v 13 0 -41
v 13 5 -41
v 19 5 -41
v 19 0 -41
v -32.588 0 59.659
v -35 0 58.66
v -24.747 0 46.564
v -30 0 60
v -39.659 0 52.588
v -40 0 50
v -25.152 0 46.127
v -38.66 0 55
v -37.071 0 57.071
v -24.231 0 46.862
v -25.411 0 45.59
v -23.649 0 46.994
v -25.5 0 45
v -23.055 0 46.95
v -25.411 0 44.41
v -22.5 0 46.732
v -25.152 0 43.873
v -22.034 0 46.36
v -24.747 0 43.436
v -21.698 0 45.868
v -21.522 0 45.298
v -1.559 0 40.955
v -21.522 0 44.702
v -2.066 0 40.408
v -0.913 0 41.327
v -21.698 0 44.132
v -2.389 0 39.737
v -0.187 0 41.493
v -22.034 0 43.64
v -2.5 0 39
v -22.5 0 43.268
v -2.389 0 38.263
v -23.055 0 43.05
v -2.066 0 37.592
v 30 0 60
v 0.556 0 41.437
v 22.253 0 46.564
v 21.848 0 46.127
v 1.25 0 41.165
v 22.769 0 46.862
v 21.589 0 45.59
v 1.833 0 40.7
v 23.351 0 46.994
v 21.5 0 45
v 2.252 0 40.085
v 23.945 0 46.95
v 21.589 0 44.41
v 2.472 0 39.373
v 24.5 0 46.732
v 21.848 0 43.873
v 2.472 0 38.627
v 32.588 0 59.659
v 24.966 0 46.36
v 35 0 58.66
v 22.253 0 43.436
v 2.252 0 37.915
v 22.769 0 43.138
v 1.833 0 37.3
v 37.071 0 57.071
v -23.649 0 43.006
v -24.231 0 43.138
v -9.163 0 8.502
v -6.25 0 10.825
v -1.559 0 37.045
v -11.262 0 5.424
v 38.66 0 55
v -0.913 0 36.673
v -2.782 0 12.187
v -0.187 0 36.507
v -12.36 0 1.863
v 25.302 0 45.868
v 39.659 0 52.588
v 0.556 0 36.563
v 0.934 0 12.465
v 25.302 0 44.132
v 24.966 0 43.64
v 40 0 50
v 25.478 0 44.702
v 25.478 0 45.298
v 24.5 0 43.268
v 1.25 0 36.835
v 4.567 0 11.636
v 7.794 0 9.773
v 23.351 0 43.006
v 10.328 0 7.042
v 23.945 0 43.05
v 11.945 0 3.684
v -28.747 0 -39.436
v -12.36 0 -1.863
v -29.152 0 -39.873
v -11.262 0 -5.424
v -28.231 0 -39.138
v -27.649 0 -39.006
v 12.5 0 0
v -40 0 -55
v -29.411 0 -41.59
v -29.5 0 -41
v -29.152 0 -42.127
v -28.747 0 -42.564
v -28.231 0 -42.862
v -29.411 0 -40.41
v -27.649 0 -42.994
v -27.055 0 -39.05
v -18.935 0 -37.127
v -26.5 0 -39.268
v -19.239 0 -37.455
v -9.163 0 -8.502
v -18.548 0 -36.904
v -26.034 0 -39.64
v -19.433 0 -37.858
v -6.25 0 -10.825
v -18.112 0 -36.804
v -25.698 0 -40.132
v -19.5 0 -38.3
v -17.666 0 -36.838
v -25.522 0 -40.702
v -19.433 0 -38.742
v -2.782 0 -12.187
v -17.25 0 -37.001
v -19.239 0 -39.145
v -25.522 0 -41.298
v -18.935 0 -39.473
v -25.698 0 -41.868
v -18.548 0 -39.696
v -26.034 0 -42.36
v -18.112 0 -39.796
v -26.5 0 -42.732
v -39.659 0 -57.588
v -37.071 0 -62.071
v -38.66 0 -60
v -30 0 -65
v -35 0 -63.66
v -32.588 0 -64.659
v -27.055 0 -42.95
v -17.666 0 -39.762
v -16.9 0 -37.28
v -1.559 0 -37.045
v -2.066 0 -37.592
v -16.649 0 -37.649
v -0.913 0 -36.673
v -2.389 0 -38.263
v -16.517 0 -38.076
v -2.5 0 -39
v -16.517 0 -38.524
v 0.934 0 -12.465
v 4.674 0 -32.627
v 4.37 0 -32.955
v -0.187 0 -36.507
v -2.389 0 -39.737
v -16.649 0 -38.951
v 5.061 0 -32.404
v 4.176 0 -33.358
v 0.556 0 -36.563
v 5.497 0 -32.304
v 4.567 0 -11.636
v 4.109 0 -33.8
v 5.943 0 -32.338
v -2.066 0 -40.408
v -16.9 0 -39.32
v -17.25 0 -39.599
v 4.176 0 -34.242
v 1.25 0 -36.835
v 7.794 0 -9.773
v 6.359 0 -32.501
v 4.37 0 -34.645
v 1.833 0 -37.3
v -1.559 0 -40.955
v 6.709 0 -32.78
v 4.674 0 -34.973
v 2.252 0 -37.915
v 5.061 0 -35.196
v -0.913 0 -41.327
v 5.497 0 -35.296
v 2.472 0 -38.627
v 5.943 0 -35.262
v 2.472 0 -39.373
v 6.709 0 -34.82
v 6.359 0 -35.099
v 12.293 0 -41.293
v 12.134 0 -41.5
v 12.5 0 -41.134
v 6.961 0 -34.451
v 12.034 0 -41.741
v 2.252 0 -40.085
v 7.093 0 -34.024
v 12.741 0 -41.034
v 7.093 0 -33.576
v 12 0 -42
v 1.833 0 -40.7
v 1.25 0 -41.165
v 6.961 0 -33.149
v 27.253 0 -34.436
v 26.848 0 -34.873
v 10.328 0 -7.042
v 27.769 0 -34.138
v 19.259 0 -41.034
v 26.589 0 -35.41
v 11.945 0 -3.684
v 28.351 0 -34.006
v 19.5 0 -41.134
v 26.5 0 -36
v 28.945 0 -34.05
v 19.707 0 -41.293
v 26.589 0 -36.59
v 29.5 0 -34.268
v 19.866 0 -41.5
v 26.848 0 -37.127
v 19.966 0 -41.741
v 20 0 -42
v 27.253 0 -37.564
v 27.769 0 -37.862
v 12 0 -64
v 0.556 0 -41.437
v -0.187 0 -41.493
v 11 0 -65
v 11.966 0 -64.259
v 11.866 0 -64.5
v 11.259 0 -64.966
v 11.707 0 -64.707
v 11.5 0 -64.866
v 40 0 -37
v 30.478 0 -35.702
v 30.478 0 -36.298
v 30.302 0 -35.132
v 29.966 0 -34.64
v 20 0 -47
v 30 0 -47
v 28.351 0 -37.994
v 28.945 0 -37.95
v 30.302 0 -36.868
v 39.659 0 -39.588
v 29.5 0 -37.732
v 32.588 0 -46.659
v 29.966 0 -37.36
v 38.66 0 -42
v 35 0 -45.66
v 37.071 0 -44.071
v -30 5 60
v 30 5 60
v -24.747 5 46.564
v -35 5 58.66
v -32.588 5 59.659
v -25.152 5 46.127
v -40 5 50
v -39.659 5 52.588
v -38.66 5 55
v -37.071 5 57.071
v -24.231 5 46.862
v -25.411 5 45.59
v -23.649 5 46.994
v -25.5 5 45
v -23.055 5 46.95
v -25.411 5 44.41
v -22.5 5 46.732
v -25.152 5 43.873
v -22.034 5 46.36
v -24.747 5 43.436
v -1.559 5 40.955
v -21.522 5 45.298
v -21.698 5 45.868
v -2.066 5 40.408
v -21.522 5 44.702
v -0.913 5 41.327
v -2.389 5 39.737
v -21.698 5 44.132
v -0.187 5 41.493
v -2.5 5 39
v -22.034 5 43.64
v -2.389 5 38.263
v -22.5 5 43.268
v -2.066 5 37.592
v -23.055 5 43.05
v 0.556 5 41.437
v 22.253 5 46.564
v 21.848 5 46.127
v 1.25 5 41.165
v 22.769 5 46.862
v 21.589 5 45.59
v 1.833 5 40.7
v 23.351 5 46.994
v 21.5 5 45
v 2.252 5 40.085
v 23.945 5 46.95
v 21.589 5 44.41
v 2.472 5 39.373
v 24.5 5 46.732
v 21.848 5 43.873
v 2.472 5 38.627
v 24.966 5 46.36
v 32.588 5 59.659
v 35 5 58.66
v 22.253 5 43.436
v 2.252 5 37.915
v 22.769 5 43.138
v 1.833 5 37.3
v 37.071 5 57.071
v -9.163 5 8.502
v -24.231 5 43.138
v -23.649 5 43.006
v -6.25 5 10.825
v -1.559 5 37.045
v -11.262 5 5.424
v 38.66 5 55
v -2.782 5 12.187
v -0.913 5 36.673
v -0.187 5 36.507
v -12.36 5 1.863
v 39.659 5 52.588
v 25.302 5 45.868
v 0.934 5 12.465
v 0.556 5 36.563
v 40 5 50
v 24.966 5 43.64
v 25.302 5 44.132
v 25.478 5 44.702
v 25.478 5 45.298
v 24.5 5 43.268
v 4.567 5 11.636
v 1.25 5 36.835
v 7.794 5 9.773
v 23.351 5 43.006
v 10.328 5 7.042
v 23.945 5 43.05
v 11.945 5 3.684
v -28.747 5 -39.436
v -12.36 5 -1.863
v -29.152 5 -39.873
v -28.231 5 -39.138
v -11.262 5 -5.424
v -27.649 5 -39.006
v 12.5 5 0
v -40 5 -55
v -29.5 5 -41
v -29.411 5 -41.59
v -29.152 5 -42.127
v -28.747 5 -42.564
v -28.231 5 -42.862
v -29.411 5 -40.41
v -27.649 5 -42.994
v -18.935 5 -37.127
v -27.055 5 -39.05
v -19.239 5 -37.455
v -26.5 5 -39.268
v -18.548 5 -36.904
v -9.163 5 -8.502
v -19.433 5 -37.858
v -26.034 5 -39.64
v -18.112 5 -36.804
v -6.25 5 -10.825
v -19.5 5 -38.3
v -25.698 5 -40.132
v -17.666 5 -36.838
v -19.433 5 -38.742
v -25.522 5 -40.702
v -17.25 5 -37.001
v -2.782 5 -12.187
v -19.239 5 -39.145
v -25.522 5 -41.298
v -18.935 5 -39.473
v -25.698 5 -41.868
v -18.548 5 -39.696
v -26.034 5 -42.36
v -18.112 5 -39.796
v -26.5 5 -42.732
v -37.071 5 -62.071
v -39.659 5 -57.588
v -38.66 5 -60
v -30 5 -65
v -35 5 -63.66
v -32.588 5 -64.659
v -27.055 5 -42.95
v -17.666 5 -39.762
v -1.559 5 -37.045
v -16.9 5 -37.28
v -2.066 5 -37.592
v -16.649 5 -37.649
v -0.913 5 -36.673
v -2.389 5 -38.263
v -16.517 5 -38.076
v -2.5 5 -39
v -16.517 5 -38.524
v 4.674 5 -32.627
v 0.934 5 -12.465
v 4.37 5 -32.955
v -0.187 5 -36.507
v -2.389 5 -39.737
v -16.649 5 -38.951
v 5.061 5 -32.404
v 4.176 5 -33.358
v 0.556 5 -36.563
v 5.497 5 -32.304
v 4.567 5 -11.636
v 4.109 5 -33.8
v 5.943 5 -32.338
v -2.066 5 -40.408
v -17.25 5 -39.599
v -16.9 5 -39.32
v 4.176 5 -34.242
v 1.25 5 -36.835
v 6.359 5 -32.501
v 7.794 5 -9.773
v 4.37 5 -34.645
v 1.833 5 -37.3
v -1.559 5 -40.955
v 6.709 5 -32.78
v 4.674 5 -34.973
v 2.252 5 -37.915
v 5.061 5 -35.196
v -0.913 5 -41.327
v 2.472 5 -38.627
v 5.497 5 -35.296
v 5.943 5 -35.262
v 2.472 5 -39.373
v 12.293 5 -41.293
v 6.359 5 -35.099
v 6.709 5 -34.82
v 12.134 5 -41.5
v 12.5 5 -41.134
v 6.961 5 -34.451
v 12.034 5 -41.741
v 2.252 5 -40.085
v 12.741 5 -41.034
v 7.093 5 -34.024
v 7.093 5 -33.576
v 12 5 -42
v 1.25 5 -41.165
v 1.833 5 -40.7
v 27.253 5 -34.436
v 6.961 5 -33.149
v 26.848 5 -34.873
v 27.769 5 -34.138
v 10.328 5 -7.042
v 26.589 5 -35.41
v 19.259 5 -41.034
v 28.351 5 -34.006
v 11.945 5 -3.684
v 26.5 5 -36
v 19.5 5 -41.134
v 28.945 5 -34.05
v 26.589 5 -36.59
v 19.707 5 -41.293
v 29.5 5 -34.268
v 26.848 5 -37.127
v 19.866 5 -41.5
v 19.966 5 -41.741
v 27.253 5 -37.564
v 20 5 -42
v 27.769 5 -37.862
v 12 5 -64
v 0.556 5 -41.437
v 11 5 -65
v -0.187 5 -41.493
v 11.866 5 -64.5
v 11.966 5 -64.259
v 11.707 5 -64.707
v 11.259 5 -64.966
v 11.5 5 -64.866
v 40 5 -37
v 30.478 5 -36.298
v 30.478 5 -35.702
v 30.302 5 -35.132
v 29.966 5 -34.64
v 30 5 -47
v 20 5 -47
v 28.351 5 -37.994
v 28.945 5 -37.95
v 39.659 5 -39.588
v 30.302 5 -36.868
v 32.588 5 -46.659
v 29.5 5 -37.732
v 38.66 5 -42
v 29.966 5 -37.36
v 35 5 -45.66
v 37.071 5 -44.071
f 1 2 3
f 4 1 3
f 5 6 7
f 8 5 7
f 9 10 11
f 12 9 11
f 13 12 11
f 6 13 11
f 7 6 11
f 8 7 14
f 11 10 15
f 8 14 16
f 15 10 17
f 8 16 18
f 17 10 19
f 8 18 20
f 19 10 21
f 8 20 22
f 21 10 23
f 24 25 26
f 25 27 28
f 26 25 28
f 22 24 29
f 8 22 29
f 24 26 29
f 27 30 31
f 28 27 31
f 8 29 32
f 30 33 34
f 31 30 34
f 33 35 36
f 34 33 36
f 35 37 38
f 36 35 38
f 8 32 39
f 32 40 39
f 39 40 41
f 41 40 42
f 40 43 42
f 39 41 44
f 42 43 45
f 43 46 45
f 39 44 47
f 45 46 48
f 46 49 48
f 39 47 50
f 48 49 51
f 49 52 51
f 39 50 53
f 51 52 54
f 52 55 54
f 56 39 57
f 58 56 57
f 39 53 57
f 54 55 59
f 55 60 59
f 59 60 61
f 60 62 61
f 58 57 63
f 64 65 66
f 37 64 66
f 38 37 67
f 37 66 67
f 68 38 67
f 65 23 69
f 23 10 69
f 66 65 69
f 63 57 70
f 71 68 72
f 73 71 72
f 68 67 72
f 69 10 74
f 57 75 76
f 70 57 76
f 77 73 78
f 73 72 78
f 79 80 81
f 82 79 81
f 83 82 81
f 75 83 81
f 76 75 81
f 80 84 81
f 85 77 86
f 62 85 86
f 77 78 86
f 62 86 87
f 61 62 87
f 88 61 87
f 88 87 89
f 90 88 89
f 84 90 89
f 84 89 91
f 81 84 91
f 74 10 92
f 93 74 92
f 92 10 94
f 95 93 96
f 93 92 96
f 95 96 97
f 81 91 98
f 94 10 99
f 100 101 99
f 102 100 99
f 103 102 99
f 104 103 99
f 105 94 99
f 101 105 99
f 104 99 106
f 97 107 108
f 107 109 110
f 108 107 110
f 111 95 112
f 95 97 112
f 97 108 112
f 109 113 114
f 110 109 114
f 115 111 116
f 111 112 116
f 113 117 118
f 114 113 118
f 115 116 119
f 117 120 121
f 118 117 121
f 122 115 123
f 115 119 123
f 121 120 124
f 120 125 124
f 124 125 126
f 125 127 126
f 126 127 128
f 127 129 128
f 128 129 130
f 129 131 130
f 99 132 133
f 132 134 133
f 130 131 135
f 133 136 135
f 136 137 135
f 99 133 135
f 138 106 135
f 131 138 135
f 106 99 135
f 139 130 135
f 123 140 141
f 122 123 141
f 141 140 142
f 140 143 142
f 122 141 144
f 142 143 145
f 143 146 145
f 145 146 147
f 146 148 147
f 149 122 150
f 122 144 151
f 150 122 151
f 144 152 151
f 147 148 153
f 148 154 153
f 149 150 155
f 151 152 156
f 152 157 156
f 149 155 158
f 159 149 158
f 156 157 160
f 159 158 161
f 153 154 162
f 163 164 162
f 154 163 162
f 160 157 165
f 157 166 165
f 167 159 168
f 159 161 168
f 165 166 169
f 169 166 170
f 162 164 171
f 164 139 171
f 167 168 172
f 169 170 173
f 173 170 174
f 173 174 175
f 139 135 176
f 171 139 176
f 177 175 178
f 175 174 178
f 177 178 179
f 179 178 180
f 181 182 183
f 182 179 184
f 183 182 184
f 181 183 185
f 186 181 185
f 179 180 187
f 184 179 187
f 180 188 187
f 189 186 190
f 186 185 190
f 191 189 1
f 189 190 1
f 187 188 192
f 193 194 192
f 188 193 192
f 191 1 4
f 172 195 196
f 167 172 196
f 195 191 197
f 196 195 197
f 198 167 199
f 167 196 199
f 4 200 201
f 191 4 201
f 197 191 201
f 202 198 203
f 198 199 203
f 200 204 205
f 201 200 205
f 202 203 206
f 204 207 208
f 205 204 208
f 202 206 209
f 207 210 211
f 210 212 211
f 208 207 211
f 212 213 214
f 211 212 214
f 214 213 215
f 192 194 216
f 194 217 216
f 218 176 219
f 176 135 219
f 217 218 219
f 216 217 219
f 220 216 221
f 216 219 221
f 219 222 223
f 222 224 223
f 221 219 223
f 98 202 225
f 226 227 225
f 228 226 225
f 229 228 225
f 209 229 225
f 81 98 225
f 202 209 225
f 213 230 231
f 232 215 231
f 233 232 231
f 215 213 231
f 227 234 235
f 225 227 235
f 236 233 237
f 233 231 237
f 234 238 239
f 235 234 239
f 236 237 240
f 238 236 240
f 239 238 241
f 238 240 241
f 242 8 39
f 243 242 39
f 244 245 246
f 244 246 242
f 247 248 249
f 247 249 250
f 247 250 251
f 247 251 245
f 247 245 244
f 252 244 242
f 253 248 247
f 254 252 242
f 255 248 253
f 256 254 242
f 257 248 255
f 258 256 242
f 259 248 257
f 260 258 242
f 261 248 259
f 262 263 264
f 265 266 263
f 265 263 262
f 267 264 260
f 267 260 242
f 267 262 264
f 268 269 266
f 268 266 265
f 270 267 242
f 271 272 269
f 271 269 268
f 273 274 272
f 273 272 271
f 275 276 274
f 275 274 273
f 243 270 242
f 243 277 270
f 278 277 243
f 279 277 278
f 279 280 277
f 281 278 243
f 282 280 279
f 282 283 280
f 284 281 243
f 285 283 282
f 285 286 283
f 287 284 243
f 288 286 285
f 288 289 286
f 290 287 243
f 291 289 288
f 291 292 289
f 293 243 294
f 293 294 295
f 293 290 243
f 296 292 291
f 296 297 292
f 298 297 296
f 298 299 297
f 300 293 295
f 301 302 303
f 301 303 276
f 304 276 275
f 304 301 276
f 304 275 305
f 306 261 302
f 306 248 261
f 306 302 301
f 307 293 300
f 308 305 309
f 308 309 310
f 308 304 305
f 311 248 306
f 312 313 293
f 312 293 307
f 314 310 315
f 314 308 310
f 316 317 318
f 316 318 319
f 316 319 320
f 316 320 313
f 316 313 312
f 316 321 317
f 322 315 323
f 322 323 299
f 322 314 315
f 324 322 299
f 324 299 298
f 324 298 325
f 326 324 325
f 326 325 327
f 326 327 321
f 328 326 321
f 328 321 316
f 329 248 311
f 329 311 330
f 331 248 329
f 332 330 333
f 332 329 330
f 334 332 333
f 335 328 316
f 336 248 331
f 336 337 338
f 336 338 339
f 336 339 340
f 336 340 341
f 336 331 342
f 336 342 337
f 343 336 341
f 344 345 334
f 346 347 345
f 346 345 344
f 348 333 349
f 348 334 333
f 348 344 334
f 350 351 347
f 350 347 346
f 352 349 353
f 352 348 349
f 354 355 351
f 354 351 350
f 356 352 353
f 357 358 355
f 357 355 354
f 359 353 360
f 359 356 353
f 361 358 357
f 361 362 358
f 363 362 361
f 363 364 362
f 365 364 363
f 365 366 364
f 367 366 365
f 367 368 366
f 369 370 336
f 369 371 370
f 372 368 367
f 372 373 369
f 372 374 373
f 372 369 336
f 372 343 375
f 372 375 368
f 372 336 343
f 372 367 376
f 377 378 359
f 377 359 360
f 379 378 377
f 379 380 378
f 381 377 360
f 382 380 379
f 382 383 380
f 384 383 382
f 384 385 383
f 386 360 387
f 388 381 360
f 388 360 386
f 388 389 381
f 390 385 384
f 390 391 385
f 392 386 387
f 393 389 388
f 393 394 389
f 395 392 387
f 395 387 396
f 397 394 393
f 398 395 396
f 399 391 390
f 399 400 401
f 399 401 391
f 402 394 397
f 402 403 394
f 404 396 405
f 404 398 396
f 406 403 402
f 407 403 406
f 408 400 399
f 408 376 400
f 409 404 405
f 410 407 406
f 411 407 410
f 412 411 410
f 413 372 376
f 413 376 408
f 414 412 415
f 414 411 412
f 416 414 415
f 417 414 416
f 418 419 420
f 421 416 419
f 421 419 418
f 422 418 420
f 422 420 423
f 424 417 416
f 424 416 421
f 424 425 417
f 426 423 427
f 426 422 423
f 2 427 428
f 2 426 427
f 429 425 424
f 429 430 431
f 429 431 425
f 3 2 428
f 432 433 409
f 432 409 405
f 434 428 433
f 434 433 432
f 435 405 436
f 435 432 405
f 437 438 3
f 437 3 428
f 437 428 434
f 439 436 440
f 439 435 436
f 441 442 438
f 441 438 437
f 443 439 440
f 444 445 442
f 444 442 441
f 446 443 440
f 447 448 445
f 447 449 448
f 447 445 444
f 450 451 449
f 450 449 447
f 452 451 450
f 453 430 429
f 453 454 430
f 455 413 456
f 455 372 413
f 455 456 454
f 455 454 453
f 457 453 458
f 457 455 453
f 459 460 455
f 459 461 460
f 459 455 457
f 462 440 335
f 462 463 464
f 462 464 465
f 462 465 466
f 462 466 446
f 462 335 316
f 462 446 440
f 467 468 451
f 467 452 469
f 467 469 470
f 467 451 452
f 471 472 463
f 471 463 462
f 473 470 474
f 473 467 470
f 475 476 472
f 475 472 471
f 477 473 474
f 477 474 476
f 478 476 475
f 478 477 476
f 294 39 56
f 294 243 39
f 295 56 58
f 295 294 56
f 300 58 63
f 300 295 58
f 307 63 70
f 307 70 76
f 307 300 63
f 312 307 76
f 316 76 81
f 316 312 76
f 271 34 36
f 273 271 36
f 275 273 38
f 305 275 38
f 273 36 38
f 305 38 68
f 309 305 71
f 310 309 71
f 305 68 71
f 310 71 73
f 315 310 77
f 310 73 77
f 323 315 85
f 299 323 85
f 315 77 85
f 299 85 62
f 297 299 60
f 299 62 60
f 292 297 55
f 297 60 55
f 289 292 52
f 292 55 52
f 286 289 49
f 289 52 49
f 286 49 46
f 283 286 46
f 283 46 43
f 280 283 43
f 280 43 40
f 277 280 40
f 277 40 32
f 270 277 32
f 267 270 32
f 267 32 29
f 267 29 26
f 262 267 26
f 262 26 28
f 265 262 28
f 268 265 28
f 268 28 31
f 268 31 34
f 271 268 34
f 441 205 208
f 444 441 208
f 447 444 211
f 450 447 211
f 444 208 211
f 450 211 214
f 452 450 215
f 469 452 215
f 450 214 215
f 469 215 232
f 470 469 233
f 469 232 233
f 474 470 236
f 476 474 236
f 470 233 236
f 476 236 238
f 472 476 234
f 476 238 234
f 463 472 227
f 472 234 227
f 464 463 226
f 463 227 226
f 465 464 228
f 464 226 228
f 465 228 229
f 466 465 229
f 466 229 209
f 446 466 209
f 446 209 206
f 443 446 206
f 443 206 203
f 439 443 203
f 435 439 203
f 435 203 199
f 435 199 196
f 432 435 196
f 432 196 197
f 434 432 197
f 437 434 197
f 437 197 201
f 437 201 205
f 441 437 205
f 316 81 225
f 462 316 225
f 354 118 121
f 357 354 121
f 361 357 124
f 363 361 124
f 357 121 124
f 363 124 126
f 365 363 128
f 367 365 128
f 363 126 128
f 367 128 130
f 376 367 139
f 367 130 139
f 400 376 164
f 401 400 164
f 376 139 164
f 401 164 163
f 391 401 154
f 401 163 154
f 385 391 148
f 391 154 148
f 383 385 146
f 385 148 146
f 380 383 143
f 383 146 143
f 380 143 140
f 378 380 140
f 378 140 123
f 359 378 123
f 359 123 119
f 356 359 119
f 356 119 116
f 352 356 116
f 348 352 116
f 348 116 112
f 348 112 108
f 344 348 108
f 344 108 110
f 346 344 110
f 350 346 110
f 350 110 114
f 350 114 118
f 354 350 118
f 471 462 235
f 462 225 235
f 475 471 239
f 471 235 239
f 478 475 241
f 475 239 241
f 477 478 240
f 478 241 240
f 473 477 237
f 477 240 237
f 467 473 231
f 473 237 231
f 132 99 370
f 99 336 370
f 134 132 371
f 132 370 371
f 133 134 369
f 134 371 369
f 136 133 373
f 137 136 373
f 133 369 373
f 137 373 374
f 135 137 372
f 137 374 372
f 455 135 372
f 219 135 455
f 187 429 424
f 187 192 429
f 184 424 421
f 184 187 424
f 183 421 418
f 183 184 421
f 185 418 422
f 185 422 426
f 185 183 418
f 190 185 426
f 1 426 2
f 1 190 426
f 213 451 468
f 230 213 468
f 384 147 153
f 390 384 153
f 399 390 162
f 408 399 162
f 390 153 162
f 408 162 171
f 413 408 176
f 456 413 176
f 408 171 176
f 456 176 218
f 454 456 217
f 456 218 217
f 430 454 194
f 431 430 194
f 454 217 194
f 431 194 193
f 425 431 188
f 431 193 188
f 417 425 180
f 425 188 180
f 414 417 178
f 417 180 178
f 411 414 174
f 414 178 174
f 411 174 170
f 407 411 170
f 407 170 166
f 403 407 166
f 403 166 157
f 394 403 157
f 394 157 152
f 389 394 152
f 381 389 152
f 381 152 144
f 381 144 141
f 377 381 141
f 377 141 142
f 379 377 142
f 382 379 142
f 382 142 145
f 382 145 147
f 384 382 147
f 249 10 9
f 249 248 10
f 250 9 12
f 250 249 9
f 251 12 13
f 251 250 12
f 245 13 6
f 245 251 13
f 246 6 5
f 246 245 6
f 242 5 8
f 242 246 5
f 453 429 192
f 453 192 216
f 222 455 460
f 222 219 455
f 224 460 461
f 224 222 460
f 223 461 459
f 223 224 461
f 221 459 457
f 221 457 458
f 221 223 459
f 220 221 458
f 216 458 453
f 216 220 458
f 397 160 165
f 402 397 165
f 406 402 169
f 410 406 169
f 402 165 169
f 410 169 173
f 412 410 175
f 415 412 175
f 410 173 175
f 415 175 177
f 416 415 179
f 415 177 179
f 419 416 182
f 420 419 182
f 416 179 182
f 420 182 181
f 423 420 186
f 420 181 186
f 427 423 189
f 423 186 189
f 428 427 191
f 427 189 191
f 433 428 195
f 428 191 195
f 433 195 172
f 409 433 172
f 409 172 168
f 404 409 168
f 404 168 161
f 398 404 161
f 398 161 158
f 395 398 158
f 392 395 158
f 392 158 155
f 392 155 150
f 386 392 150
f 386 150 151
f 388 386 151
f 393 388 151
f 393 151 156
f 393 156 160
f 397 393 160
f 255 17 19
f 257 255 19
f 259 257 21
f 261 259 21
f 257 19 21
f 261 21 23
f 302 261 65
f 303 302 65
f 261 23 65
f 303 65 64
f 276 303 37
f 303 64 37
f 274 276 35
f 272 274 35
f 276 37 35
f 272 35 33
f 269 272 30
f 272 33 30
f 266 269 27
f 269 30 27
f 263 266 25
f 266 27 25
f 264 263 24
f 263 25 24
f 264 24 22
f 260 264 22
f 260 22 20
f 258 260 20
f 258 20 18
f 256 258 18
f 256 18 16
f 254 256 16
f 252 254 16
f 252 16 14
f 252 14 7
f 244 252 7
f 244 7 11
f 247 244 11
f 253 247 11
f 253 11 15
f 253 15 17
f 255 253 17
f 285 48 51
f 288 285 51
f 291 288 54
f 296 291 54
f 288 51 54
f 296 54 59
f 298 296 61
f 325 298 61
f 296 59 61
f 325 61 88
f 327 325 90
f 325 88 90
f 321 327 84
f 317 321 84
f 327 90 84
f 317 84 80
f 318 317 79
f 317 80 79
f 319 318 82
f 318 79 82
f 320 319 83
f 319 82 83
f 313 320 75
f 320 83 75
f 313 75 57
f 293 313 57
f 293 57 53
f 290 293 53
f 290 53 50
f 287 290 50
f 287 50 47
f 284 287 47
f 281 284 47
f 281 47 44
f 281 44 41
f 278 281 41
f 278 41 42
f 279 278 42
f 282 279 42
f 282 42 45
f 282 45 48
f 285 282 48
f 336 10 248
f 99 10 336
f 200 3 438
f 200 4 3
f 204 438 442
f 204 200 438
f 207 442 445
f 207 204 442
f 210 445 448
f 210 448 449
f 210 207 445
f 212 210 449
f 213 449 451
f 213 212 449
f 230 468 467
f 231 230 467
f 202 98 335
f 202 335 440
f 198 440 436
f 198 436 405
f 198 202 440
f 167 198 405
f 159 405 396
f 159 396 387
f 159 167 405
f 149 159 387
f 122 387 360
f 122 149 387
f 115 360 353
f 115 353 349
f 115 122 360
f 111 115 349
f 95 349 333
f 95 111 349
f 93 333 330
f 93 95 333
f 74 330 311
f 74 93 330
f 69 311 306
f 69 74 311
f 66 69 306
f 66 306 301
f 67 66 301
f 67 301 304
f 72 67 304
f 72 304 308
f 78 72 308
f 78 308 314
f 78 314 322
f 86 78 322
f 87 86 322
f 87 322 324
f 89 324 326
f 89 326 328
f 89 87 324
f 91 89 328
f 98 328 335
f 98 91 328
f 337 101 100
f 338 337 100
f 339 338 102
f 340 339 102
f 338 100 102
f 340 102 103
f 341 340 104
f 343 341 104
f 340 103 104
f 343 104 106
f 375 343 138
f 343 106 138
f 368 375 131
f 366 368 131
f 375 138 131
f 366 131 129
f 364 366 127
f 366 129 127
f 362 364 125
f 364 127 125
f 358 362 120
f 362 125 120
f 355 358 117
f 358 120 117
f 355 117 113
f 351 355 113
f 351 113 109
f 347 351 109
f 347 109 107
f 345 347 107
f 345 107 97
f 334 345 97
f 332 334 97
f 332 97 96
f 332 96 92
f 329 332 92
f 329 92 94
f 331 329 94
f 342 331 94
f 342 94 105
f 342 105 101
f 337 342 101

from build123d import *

# Parameters (mm, degrees)
SKETCH_1_W          = 80
SKETCH_1_H          = 125
SKETCH_1_R          = 12.5
EXTRUDE_1_DEPTH     = 5
SKETCH_2_W          = 28
SKETCH_2_H          = 18
CUT_EXTRUDE_1_DEPTH = 6
MM_CLEARANCE_1_D    = 4
MM_TRANSITIONAL_1_D = 5
FILLET_1_R          = 10
MM_TRANSITIONAL_2_D = 3
SKETCH_12_W         = 8
SKETCH_12_H         = 6
CUT_EXTRUDE_2_DEPTH = 6
FILLET_2_R          = 1


with BuildPart() as part:
    # 草图1 → 凸台-拉伸1 (new body)
    with BuildSketch(Plane(origin=(0, 0, 0), x_dir=(1, 0, 0), z_dir=(0, 1, 0))):
        with Locations((0, 2.5)):
            Rectangle(SKETCH_1_W, SKETCH_1_H)
        Circle(SKETCH_1_R, mode=Mode.SUBTRACT)
    extrude(amount=EXTRUDE_1_DEPTH)

    # 草图2 → 切除-拉伸1 (cut, through all)
    with BuildSketch(Plane(origin=(0, 5, 0), x_dir=(1, 0, 0), z_dir=(0, 1, 0))):
        with Locations((26, 56)):
            Rectangle(SKETCH_2_W, SKETCH_2_H)
    extrude(amount=-CUT_EXTRUDE_1_DEPTH, mode=Mode.SUBTRACT)

    # 大小mm Clearance 暗销孔1 (through all)
    with Locations(Plane(origin=(0, 5, 0), x_dir=(1, 0, 0), z_dir=(0, 1, 0))):
        with Locations((-23.5, -45), (23.5, -45), (28.5, 36), (-27.5, 41)):
            Hole(MM_CLEARANCE_1_D / 2)

    # 大小mm Transitional 暗销孔1 (through all)
    with Locations(Plane(origin=(0, 5, 0), x_dir=(1, 0, 0), z_dir=(0, 1, 0))):
        with Locations((0, -39), (0, 39)):
            Hole(MM_TRANSITIONAL_1_D / 2)

    # 圆角1
    fillet_1_edges = [part.edges().sort_by_distance(p)[0] for p in [
        (40, 2.5, -47),
        (-40, 2.5, -65),
        (40, 2.5, 60),
        (-40, 2.5, 60),
    ]]
    fillet(fillet_1_edges, radius=FILLET_1_R)

    # 大小mm Transitional 暗销孔2 (through all)
    with Locations(Plane(origin=(0, 5, 0), x_dir=(1, 0, 0), z_dir=(0, 1, 0))):
        with Locations((5.609431358, 33.8), (-18, 38.3)):
            Hole(MM_TRANSITIONAL_2_D / 2)

    # 草图12 → 切除-拉伸2 (cut, through all)
    with BuildSketch(Plane(origin=(0, 5, 0), x_dir=(1, 0, 0), z_dir=(0, 1, 0))):
        with Locations((16, 44)):
            Rectangle(SKETCH_12_W, SKETCH_12_H)
    extrude(amount=-CUT_EXTRUDE_2_DEPTH, mode=Mode.SUBTRACT)

    # 圆角2
    fillet_2_edges = [part.edges().sort_by_distance(p)[0] for p in [
        (12, 2.5, -41),
        (20, 2.5, -41),
        (12, 2.5, -65),
    ]]
    fillet(fillet_2_edges, radius=FILLET_2_R)


solid = part.part
